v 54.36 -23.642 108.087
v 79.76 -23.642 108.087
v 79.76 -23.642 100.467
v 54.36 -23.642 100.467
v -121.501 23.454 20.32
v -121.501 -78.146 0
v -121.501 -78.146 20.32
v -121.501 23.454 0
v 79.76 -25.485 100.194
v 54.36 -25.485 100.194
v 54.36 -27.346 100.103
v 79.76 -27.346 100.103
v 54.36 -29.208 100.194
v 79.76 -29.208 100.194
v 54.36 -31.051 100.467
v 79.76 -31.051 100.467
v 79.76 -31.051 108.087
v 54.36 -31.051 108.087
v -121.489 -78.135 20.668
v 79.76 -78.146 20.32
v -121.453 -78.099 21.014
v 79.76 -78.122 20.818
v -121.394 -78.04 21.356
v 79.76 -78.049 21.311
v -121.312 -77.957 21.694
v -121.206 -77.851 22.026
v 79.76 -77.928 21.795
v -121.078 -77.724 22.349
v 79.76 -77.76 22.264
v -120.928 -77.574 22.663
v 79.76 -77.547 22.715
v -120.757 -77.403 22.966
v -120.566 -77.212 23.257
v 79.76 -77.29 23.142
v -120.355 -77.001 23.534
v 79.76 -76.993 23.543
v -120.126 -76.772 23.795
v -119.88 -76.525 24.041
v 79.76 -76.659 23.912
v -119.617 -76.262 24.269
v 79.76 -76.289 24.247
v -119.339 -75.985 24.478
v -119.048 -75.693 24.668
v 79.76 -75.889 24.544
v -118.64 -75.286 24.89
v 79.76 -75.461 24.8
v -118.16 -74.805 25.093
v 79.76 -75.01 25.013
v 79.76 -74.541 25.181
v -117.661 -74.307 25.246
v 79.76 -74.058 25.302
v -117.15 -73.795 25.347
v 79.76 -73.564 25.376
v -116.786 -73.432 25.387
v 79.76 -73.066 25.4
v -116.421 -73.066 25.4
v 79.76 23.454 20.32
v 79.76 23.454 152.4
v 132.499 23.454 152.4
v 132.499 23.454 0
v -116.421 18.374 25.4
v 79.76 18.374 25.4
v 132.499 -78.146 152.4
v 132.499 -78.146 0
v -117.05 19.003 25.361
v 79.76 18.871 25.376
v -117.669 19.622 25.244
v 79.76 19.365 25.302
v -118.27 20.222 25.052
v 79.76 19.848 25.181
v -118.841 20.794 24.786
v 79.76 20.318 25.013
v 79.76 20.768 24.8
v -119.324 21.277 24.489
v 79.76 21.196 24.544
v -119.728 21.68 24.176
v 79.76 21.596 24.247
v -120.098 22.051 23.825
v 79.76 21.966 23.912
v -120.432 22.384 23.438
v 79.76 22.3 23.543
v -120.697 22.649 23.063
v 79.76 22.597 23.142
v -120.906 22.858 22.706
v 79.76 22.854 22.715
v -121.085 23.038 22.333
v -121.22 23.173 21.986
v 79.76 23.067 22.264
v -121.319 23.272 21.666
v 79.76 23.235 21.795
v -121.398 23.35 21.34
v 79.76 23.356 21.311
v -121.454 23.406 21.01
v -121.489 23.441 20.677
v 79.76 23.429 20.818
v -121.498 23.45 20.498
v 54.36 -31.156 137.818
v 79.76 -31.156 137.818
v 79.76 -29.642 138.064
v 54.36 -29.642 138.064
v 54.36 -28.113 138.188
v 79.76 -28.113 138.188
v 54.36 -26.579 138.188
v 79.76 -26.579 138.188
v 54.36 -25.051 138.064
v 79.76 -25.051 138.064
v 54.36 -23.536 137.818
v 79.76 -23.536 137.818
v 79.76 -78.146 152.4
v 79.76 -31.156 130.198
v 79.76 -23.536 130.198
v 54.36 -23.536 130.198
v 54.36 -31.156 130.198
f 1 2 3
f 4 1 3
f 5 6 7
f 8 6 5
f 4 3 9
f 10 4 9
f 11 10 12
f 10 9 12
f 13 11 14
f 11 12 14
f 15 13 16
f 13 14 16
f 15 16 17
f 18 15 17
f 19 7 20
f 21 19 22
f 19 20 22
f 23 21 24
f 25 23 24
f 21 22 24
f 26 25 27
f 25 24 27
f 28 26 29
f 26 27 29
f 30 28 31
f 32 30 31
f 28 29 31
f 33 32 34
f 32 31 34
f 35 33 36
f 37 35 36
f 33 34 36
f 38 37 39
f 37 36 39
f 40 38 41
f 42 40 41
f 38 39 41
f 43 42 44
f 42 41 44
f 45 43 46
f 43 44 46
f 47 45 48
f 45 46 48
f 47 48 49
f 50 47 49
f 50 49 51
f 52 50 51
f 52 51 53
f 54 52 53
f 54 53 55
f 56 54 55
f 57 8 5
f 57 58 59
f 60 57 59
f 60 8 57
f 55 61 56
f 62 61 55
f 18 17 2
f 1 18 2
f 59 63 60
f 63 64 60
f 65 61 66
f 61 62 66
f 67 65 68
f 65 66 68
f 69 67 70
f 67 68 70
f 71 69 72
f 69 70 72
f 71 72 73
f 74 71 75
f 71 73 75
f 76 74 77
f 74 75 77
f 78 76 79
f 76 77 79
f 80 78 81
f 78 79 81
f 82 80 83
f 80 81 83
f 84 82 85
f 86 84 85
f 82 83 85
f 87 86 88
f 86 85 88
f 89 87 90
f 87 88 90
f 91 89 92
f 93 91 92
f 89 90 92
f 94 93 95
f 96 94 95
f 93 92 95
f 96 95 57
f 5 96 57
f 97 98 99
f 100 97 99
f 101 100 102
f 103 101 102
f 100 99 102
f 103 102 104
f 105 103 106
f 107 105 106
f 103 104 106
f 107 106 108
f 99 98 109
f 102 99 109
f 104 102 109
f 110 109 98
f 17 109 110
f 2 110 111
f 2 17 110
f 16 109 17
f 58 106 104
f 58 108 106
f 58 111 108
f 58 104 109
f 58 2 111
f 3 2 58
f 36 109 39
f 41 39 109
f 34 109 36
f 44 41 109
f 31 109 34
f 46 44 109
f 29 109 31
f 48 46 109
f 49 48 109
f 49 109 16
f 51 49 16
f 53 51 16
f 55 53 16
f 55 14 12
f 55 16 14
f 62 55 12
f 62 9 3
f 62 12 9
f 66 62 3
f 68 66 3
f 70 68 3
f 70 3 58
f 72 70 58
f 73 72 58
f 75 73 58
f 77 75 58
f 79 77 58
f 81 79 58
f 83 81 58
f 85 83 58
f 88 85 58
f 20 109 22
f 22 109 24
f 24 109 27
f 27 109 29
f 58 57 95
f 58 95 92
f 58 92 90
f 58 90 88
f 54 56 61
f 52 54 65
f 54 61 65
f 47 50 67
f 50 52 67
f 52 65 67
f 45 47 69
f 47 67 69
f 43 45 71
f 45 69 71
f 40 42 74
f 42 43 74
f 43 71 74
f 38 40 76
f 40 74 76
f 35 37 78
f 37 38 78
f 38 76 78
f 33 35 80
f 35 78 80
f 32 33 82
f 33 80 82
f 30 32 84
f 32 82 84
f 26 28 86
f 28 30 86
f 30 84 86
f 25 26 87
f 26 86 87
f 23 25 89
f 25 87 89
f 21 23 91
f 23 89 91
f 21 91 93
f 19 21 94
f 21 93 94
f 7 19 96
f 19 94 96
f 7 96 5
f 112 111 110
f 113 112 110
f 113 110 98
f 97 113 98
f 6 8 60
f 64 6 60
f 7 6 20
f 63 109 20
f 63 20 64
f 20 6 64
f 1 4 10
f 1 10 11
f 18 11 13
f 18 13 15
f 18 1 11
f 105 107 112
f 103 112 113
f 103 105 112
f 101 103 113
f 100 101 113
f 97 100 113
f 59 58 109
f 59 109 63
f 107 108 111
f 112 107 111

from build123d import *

# Parameters (mm, degrees)
F0_W     = 254
F0_H     = 101.6
F1_DEPTH = 25.4
F2_W     = 52.7394
F2_H     = 101.6
F3_DEPTH = 127
F5_DEPTH = 25.4
F6_R     = 5.08


with BuildPart() as f1:
    # F0 (on Top) → F1 (new body)
    with BuildSketch(Plane.XY):
        with Locations((5.498968, -27.346462)):
            Rectangle(F0_W, F0_H)
    extrude(amount=F1_DEPTH)

    # F2 (on face) → F3 (join)
    with BuildSketch(Plane.XY.offset(25.4)):
        with Locations((106.129268, -27.346462)):
            Rectangle(F2_W, F2_H)
    extrude(amount=F3_DEPTH)

    # F4 (on face) → F5 (join)
    with BuildSketch(Plane(origin=(79.759568, 0, 0), x_dir=(0, -1, 0), z_dir=(-1, 0, 0))):
        with BuildLine():
            ThreePointArc((31.156462, 137.818299), (27.346462, 138.203187), (23.536462, 137.818299))
            Line((23.536462, 137.818299), (23.536462, 130.198299))
            Line((23.536462, 130.198299), (31.156462, 130.198299))
            Line((31.156462, 130.198299), (31.156462, 137.818299))
        make_face()
        with BuildLine():
            Line((23.642148, 108.086814), (23.642148, 100.466814))
            ThreePointArc((23.642148, 100.466814), (27.346462, 100.103187), (31.050777, 100.466814))
            Line((31.050777, 100.466814), (31.050777, 108.086814))
            Line((31.050777, 108.086814), (23.642148, 108.086814))
        make_face()
    extrude(amount=F5_DEPTH)

    # F6
    f6_edges = [f1.edges().sort_by_distance(p)[0] for p in [
        (-20.870732, -78.146462, 25.4),
        (-121.501032, -27.346462, 25.4),
        (-20.870732, 23.453538, 25.4),
    ]]
    fillet(f6_edges, radius=F6_R)


solid = f1.part
